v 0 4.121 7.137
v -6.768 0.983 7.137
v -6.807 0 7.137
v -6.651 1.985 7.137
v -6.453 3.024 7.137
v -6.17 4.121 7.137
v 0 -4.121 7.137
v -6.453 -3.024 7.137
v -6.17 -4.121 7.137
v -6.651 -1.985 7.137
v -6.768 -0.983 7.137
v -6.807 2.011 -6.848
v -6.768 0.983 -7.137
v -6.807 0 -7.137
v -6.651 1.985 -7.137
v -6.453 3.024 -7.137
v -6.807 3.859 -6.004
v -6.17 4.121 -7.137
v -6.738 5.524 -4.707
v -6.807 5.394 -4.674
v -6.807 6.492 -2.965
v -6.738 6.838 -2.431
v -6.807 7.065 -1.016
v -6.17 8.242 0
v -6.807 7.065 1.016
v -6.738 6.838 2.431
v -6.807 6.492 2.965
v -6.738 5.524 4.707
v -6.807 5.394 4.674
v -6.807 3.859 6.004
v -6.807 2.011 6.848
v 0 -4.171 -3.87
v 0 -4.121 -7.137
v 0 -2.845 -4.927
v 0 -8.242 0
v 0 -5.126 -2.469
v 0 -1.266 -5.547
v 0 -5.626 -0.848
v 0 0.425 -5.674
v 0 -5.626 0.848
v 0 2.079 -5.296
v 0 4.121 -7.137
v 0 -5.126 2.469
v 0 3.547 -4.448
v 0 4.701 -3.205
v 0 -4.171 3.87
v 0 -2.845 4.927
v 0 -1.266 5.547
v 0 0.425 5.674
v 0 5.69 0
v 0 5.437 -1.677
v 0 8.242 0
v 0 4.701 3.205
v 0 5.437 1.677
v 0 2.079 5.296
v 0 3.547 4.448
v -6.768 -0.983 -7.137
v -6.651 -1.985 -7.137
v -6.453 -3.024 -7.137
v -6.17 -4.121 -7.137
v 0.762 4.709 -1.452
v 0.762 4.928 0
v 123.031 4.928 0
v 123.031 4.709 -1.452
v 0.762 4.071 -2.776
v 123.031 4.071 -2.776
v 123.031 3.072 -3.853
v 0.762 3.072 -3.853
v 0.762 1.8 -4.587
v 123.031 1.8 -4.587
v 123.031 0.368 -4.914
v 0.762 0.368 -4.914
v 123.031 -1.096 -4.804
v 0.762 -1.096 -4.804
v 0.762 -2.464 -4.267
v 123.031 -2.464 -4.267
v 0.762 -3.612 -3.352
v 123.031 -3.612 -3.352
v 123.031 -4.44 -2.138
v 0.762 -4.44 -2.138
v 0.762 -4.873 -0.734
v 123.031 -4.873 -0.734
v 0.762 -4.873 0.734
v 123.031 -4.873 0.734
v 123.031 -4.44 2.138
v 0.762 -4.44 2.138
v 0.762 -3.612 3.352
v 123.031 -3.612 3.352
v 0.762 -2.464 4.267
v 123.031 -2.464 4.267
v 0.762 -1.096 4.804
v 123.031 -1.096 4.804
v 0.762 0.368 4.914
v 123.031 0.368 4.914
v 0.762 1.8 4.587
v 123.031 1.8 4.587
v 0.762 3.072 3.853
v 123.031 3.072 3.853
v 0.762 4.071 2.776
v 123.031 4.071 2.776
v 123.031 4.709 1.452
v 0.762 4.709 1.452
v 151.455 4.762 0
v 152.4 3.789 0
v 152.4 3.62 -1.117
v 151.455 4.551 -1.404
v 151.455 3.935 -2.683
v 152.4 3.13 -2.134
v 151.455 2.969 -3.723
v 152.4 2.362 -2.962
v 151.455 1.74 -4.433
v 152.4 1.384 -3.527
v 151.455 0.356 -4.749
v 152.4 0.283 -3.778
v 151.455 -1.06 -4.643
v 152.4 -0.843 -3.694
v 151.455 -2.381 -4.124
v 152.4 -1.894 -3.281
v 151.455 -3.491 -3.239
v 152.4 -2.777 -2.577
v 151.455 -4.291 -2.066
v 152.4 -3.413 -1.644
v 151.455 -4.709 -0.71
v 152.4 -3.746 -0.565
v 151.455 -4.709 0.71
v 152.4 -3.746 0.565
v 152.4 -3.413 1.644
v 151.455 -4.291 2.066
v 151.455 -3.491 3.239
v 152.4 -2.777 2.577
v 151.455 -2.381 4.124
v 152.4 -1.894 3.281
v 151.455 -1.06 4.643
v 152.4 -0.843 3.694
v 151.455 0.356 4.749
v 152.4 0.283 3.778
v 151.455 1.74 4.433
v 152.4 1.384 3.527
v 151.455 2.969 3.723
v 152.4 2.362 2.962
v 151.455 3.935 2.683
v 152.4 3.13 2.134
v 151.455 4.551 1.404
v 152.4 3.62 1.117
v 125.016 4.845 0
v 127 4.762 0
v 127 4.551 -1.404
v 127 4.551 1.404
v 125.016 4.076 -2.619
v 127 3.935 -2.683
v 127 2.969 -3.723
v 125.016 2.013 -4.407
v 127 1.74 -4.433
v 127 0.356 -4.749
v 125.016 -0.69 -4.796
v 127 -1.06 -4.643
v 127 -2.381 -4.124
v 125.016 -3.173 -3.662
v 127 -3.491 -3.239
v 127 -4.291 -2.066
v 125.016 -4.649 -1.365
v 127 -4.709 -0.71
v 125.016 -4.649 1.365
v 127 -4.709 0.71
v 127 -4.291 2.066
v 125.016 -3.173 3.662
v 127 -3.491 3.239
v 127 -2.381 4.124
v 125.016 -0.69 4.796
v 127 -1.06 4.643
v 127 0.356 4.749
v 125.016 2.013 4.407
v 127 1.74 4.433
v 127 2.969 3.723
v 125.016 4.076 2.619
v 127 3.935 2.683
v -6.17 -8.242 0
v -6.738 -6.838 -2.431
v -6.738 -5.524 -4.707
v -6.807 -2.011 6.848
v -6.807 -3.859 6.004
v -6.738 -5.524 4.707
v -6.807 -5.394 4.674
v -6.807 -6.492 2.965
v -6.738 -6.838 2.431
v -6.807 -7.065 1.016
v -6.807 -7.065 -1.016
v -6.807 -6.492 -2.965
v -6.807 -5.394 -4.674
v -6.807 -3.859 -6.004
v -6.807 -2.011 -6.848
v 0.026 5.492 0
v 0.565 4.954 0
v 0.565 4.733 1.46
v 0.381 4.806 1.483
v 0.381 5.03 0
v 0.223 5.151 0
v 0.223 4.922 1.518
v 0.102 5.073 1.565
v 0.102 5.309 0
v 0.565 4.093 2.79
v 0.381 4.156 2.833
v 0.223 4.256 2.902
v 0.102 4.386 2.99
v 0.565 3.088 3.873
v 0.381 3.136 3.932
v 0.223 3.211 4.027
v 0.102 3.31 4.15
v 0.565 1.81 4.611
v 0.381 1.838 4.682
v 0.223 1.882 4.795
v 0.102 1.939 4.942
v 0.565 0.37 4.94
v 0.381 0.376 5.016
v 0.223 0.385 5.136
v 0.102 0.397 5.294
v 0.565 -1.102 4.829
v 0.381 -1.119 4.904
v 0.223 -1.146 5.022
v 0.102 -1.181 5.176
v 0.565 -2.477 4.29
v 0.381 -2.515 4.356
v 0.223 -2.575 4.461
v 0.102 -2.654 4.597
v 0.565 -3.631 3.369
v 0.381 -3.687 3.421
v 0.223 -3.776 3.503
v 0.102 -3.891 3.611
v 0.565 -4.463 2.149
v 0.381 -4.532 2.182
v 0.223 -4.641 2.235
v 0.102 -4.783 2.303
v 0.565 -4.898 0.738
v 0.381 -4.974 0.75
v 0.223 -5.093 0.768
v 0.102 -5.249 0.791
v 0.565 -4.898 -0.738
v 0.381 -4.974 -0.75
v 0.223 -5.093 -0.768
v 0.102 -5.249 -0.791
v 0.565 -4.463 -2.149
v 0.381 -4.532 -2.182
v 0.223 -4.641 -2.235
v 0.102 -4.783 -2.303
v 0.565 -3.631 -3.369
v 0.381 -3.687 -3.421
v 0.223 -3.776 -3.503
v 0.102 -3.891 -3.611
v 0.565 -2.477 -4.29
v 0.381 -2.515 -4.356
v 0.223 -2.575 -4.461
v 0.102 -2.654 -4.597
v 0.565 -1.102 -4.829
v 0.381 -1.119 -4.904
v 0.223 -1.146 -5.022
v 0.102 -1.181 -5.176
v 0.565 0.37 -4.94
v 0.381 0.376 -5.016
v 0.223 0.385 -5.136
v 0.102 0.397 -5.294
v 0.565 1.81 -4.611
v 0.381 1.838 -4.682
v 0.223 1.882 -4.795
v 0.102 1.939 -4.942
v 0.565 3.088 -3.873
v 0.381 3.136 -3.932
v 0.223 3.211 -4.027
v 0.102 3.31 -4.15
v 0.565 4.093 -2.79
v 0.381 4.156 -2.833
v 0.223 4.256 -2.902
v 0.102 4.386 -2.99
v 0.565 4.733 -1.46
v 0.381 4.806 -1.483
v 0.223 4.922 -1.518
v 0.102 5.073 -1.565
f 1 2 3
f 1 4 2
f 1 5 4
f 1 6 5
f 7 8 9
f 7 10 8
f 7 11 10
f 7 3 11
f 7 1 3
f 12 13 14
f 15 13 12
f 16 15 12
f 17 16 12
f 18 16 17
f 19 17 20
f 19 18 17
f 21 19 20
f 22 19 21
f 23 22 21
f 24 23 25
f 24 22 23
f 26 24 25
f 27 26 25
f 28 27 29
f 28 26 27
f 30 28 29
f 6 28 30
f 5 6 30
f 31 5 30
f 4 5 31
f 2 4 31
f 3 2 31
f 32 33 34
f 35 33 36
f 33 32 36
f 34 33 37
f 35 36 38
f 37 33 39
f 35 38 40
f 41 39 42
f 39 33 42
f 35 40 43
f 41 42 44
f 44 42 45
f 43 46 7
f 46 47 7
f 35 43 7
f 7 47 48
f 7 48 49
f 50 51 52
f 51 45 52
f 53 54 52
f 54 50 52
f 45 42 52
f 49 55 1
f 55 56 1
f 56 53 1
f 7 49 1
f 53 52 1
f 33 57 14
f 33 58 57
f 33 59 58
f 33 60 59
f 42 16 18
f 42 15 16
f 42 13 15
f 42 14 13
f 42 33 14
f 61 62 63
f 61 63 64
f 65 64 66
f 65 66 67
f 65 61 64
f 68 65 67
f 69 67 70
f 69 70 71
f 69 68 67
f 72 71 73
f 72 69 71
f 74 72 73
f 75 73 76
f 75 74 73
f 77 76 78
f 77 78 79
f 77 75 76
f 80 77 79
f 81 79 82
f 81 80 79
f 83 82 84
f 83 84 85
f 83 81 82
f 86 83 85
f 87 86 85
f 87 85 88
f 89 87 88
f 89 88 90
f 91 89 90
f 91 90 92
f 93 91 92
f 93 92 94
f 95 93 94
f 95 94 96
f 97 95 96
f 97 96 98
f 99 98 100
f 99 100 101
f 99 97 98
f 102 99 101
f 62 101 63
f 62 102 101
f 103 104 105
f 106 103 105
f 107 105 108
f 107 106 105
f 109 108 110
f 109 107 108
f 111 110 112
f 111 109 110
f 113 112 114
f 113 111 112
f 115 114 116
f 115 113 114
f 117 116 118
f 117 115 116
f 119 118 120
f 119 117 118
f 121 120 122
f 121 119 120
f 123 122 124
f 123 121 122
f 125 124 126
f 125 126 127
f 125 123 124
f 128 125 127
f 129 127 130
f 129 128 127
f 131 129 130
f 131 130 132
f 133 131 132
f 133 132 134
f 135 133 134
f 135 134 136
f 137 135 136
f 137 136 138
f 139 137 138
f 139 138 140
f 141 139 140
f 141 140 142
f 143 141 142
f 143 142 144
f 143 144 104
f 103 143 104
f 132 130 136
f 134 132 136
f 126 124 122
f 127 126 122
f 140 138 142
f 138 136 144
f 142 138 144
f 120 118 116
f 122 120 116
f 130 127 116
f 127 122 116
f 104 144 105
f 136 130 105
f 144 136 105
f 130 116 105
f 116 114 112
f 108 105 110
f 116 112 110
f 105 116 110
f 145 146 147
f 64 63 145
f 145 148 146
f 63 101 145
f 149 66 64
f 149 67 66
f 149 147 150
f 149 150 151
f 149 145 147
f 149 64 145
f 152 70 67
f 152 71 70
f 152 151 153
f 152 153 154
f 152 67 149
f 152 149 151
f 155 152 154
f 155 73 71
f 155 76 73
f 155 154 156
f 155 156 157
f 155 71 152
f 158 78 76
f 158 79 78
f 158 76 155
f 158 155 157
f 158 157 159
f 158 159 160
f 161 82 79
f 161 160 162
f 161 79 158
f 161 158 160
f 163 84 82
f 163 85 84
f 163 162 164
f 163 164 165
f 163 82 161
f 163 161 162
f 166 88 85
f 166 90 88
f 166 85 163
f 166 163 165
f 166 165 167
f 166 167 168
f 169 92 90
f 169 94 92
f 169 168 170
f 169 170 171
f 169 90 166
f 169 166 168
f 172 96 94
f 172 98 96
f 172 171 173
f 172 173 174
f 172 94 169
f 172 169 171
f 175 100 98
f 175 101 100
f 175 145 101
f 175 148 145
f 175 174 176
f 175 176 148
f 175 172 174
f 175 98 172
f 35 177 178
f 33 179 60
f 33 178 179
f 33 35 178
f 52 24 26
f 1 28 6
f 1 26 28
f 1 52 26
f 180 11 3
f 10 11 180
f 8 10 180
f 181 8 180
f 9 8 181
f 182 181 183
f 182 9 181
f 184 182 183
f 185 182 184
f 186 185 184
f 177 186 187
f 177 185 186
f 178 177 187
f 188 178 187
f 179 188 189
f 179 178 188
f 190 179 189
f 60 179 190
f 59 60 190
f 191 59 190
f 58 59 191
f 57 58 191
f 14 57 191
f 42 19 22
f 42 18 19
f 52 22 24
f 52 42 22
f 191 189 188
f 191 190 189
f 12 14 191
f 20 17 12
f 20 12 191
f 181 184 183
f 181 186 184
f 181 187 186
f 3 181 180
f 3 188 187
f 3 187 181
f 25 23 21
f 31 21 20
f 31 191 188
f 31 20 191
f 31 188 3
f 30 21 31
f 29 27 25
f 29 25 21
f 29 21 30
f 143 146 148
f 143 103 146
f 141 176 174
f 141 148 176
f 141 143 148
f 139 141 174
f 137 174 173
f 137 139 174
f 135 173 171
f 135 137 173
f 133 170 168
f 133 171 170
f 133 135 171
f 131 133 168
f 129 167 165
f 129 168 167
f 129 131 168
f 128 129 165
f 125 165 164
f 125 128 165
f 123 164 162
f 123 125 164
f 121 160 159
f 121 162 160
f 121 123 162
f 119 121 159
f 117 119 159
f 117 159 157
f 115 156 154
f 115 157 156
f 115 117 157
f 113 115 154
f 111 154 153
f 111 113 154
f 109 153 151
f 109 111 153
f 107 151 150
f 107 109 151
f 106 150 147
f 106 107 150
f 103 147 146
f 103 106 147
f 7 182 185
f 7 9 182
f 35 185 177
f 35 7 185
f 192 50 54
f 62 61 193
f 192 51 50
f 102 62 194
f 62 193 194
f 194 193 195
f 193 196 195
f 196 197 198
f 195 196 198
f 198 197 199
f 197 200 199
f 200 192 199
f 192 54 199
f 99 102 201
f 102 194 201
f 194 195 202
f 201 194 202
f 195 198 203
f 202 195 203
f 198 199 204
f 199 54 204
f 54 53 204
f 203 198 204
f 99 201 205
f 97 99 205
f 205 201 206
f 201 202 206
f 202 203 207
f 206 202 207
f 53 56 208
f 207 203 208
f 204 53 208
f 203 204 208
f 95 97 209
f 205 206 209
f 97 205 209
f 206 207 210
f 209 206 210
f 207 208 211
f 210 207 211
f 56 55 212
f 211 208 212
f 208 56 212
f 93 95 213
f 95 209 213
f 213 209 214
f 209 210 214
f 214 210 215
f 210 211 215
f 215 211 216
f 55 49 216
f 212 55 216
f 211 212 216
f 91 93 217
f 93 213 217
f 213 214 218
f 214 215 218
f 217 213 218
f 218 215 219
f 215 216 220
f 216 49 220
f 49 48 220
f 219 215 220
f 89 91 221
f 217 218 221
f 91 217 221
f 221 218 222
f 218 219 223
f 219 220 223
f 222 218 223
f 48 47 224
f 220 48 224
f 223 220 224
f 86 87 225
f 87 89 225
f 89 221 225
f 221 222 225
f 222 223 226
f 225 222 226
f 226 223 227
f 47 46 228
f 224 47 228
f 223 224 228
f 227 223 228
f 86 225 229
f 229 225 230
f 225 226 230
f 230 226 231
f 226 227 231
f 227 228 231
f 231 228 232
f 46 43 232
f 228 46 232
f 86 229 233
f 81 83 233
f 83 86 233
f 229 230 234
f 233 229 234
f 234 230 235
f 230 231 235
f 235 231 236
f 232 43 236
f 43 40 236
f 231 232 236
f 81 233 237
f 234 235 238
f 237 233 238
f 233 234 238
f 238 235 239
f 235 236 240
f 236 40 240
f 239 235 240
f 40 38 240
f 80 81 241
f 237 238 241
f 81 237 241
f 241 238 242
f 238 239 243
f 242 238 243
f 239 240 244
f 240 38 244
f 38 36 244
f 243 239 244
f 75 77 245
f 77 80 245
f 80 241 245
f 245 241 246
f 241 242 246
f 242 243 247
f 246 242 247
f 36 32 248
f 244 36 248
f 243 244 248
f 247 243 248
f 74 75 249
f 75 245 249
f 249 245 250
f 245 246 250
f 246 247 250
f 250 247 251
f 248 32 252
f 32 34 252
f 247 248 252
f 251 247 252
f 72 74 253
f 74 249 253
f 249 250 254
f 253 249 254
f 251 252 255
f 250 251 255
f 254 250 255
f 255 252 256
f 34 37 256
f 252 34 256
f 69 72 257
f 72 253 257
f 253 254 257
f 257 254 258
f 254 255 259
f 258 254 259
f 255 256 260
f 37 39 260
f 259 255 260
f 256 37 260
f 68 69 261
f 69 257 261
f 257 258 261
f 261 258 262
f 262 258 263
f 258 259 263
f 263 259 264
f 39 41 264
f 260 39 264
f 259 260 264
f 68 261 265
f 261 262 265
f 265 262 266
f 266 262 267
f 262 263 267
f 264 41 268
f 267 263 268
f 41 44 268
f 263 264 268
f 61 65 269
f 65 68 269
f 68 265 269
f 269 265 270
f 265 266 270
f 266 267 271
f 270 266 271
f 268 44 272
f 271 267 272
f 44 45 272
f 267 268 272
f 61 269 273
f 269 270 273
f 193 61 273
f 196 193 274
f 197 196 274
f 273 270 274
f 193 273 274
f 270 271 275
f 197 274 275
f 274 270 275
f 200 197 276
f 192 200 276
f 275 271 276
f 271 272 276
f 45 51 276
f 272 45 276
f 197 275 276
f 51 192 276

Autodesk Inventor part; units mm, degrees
ref_plane "YZ Plane" through (0, 0, 0) normal (1, 0, 0) x (0, 1, 0)
ref_plane "XZ Plane" through (0, 0, 0) normal (0, 1, 0) x (-1, 0, 0)
sketch "Sketch1" plane through (0, 0, 0) normal (0, 0, 1) x (1, 0, 0)
  line L0 (0, 7.1374) -> (0, 4.9276)
  line L1 (127, 4.7625) -> (152.4, 4.7625)
  line L2 (152.4, 4.7625) -> (152.4, 0)
  line L3 (152.4, 0) -> (-0.0001, 0)
  line L4 (-30.4801, 0) -> (182.88, 0) projected
  line L5 (-0.0001, 0) -> (-0.0001, 7.1374)
  line L6 (-0.0001, 7.1374) -> (0, 7.1374)
  line L7 (127, 4.7625) -> (123.0311, 4.9276)
  line L8 (123.0311, 4.9276) -> (0, 4.9276)
  line L9 (0, -1.4275) -> (0, 8.5649) projected
  dimension "d0" = 152.4
  dimension "d1" = 25.4
  dimension "d2" = 9.525
  dimension "d9" = 0.0001
  dimension "d10" = 14.2748
  dimension "d13" = 3.9689
  dimension "d14" = 9.8552
revolve "Body" add sketch "Sketch1" angle 360 about axis through (152.4, 0, 0) along (-1, 0, 0)
sketch "Sketch2" plane through (-0.0001, 0, 0) normal (-1, 0, 0) x (0, 0, 1)
  line L0 (0, 8.2416) -> (7.1374, 4.1208)
  line L1 (7.1374, 4.1208) -> (7.1374, -4.1208)
  line L2 (7.1374, -4.1208) -> (0, -8.2416)
  line L3 (0, -8.2416) -> (-7.1374, -4.1208)
  line L4 (-7.1374, -4.1208) -> (-7.1374, 4.1208)
  line L5 (-7.1374, 4.1208) -> (0, 8.2416)
  point P0 (0, 0)
  point P1 (0, 0)
  dimension "d11" = 14.2748
extrude "Head" add sketch "Sketch2" along normal blind 6.8072
sketch "Sketch4" plane through (0, 0, 0) normal (0, 0, 1) x (1, 0, 0)
  line L0 (-6.8073, 7.1374) -> (-6.8073, 8.2416)
  line L1 (-6.8073, 8.2416) -> (-6.1698, 8.2416)
  line L2 (-6.1698, 8.2416) -> (-6.8073, 7.1374)
  line L3 (-8.1687, 0) -> (1.3613, 0) projected
  line L4 (-0.0001, 8.2416) -> (-6.8073, 8.2416) projected
  line L5 (-6.8073, 4.1208) -> (-6.8073, 8.2416) projected
  dimension "d5" = 30
  dimension "d19" = 14.2748
revolve "Chamfer1" cut sketch "Sketch4" angle 360 about axis through (-10, 0, 0) along (1, 0, 0)
thread "Thread" size "3/8-16 UNC" class "2A" standard "ANSI Unified Screw Threads" length 25.4
chamfer "Chamfer2" distance 0.9739 distance2 0.9447 1 edges at (152.4, -4.7625, 0) measured on face at (152.4, -1.324, 0.065)
ref_plane "Work Plane1" through (1.525, 0, 0) normal (0, 0, 1) x (1, 0, 0)
fillet "Fillet2" radius 0.762 1 edges at (0, -4.9276, 0)
equation "\"d0\" = NLG"
equation "\"d1\" = GEL"
equation "\"d2\" = GD"
equation "\"d10\" = SD2"
equation "\"d14\" = BDM"
equation "\"d11\" = SW"
equation "\"d3\" = KOH - SD"
equation "\"d5\" = ANG1"
equation "\"d19\" = SW0"
equation "\"d63\" = R"
equation "\"d15\" = GEL"
equation "\"d6\" = -0.5 * SPD + 0.5 * GD"
equation "\"NLG\" = 152.4"
equation "\"GD\" = NND"
equation "\"BDM\" = 9.8552"
equation "\"KOH\" = 6.8072"
equation "\"GEL\" = 25.4"
equation "\"SW\" = 14.2748"
equation "\"SW0\" = SW"
equation "\"SPD\" = GD1"
equation "\"SD2\" = SW"
equation "\"SD\" = 0"
equation "\"ANG1\" = 30deg"
equation "\"GAL\" = 3.96875"
equation "\"GUL\" = 0.238 * GAL"
equation "\"R\" = 0.762"
equation "\"d62\" = -NLG - SD + GUL"
equation "\"GD1\" = 7.5773"
equation "\"THREADDIA\" = 9.525"
equation "\"TOA\" = 30deg"
equation "\"NND\" = 9.525"
equation "\"E0\" = 1.155 * SW"
properties part number "ANSI/ASME B18.2.1 - 3/8-16 UNC - 6" material "Steel, Mild"
